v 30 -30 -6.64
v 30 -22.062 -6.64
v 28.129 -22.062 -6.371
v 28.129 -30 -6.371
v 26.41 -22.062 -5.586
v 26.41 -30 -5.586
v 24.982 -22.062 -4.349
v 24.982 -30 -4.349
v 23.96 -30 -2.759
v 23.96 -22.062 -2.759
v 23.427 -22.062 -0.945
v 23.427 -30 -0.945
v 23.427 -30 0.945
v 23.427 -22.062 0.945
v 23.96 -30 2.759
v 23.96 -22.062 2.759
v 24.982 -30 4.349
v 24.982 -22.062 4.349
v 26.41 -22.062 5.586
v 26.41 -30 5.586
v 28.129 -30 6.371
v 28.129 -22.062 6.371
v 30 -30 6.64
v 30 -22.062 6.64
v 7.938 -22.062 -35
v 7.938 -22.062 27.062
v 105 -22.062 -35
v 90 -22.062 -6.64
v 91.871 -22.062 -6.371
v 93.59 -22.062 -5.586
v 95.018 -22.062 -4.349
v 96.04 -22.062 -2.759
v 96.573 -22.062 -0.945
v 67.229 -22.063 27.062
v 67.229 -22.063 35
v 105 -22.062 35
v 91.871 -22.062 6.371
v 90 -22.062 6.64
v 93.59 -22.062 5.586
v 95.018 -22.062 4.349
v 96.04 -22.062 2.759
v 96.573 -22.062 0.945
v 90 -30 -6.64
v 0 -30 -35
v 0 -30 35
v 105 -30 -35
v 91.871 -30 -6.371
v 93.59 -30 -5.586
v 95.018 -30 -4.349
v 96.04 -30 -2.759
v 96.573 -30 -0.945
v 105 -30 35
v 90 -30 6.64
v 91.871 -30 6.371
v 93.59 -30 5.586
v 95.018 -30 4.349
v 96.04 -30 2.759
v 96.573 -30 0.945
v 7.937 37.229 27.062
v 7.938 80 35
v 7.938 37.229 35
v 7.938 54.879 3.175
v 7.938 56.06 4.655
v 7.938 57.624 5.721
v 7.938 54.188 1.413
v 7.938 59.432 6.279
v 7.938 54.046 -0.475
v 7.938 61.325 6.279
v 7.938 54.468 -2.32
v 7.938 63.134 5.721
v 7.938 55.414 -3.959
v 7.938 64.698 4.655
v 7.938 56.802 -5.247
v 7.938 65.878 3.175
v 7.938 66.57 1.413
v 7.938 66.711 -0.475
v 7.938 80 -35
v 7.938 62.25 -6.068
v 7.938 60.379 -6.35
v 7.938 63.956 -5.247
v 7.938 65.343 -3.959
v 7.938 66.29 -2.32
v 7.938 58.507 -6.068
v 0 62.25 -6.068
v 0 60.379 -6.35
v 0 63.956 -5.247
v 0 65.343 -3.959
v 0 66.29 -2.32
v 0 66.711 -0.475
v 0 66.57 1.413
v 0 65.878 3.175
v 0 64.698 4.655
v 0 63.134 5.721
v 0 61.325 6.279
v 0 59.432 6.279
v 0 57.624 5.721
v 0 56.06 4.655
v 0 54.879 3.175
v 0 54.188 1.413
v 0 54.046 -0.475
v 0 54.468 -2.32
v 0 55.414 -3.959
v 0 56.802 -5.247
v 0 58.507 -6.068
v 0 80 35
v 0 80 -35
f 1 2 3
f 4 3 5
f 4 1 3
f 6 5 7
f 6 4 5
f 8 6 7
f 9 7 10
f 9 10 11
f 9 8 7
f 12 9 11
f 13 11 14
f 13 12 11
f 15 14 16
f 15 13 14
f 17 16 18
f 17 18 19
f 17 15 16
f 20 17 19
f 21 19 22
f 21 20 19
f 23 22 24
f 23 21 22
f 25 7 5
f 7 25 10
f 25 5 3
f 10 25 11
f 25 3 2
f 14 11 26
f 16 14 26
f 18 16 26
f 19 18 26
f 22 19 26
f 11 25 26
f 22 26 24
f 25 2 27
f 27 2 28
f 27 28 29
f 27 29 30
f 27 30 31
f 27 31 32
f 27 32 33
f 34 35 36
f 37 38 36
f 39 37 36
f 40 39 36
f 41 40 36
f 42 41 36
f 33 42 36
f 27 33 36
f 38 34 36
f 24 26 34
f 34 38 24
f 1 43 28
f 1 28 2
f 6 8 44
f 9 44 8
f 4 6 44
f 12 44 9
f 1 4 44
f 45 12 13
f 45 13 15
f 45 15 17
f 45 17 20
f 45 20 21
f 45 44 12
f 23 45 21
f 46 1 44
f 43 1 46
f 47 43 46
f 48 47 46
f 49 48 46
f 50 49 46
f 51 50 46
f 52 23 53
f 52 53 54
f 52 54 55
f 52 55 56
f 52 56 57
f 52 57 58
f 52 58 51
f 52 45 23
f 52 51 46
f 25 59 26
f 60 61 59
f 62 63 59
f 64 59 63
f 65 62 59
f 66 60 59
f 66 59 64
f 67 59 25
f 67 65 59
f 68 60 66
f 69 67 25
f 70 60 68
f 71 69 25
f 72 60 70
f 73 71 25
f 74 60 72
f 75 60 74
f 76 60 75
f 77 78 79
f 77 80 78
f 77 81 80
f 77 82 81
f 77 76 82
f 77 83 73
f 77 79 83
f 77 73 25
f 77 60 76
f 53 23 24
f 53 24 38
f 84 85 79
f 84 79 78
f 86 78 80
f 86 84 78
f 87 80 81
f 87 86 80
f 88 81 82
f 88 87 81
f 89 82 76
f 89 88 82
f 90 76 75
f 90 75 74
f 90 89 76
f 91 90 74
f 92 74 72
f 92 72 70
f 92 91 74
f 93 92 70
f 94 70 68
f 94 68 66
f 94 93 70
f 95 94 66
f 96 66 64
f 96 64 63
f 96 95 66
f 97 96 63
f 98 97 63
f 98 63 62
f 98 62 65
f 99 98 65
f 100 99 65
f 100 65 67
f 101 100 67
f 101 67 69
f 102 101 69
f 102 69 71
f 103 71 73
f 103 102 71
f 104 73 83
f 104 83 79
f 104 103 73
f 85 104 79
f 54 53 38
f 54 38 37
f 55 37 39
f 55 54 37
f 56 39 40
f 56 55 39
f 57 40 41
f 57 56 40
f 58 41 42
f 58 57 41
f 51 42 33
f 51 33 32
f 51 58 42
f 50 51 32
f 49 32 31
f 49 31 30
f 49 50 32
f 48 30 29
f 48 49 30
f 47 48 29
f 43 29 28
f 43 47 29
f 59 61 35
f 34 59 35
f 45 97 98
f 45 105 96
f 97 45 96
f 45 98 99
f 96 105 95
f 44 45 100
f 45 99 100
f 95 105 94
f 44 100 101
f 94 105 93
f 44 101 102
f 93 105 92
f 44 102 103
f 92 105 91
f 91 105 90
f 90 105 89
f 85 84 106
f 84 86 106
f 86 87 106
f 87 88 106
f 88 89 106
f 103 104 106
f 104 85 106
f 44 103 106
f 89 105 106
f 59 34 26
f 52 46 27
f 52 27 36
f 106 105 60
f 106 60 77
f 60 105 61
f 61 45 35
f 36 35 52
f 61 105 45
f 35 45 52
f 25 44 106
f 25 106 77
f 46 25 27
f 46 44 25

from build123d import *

# Parameters (mm, degrees)
CROQUIS1_W              = 70
CROQUIS1_H              = 110
CROQUIS1_R              = 6.35
SALIENTE_EXTRUIR1_DEPTH = 7.9375
CROQUIS2_W              = 97.0625
CROQUIS2_H              = 70
SALIENTE_EXTRUIR2_DEPTH = 7.9375
SALIENTE_EXTRUIR3_DEPTH = 7.9375


with BuildPart() as part:
    # Croquis1 → Saliente-Extruir1 (new body)
    with BuildSketch(Plane(origin=(0, 0, 0), x_dir=(0, 0, -1), z_dir=(1, 0, 0))):
        with Locations((0, 25)):
            Rectangle(CROQUIS1_W, CROQUIS1_H)
        with Locations((0, 60.378740827)):
            Circle(CROQUIS1_R, mode=Mode.SUBTRACT)
    extrude(amount=SALIENTE_EXTRUIR1_DEPTH)

    # Croquis2 → Saliente-Extruir2 (add)
    with BuildSketch(Plane.XZ.offset(30)):
        with Locations((56.46875, 0)):
            Rectangle(CROQUIS2_W, CROQUIS2_H)
        with BuildLine():
            ThreePointArc((30, -6.640349162), (23.359650838, 0), (30, 6.640349162))
            Line((30, 6.640349162), (90, 6.640349162))
            ThreePointArc((90, 6.640349162), (96.640349162, 0), (90, -6.640349162))
            Line((90, -6.640349162), (30, -6.640349162))
        make_face(mode=Mode.SUBTRACT)
    extrude(amount=-SALIENTE_EXTRUIR2_DEPTH)

    # Croquis3 → Saliente-Extruir3 (add)
    with BuildSketch(Plane(origin=(0, 0, 35), x_dir=(-1, 0, 0), z_dir=(0, 0, -1))):
        Polygon((0, 45.166428926), (-75.166428926, -30), (0, -30), align=None)
    extrude(amount=SALIENTE_EXTRUIR3_DEPTH)


solid = part.part
